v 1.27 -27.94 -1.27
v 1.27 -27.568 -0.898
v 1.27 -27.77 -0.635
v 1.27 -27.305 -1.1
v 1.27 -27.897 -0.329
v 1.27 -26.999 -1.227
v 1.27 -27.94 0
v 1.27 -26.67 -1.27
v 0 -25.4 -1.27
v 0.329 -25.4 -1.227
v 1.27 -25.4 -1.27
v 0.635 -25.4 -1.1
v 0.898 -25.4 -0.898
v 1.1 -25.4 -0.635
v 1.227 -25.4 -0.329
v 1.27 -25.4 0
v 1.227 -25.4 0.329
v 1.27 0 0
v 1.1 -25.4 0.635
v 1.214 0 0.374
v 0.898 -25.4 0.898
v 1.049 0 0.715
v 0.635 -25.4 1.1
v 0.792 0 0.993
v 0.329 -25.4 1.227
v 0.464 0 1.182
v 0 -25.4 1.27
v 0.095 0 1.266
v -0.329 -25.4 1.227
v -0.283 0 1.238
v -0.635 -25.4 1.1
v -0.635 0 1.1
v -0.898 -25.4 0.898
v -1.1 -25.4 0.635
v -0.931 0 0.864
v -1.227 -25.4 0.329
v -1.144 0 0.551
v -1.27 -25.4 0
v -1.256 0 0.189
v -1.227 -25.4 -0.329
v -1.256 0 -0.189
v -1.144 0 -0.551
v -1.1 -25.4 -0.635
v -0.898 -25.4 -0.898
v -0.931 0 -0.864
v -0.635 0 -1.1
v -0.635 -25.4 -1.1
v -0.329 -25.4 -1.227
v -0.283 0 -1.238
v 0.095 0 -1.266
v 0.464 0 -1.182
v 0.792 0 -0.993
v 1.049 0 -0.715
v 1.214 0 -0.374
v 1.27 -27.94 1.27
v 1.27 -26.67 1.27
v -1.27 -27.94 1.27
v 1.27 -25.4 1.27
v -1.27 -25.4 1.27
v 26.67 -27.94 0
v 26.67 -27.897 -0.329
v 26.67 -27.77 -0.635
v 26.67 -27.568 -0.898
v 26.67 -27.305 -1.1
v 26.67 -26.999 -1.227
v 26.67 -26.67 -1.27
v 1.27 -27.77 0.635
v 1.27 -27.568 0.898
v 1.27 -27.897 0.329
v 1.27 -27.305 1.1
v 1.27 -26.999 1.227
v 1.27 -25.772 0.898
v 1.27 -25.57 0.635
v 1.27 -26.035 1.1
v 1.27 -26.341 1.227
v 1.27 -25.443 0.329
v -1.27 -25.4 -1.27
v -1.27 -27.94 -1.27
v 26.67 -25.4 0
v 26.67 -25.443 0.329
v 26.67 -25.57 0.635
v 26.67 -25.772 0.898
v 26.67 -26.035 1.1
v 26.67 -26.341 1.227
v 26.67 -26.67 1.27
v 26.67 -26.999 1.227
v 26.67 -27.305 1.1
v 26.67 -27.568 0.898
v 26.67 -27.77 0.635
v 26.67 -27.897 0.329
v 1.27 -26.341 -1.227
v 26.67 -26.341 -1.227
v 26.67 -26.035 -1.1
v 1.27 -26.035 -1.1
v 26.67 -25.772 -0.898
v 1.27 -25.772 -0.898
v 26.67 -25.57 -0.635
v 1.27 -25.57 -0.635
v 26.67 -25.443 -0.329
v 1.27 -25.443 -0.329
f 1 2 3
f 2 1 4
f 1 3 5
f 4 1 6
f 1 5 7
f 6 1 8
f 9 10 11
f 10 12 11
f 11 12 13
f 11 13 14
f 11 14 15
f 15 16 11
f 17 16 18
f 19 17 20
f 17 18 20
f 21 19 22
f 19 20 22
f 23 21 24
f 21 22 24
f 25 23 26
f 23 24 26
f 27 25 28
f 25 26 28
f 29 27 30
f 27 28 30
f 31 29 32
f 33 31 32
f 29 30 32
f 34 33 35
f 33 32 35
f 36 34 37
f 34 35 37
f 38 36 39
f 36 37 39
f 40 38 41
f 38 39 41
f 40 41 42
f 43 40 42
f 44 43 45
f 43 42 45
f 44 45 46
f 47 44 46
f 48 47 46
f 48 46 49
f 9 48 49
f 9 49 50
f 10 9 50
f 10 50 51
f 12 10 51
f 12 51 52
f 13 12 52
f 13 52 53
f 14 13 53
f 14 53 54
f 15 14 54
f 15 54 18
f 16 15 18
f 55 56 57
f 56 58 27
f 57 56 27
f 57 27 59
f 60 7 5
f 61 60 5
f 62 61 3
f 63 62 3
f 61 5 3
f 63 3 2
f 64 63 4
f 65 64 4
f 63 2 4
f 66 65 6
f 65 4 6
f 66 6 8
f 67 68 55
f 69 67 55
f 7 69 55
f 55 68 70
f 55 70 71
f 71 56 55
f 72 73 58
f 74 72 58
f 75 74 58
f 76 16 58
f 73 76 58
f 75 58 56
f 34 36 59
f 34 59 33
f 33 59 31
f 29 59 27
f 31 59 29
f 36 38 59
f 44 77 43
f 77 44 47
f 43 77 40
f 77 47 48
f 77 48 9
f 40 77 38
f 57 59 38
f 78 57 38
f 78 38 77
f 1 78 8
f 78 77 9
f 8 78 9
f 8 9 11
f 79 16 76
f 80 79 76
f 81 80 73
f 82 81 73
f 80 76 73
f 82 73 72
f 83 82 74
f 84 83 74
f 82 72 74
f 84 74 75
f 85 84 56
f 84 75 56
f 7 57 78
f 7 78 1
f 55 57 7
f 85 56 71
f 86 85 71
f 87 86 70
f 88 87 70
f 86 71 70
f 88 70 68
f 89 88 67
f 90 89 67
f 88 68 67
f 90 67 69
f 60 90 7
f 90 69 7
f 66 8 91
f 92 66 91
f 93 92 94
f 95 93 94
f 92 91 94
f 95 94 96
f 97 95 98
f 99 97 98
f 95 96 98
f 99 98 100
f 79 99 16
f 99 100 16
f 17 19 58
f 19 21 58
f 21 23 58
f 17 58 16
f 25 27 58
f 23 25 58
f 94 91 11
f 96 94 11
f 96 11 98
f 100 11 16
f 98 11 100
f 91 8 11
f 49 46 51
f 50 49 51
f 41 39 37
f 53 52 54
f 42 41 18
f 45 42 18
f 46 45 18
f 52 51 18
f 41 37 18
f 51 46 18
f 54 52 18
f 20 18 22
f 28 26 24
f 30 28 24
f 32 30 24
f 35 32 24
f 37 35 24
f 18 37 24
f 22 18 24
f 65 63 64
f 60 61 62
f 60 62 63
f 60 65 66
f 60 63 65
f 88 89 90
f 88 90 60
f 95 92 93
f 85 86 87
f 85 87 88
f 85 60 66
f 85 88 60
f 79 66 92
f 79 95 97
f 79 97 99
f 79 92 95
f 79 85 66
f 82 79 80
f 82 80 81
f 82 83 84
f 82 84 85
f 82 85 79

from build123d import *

# Parameters (mm, degrees)
F0_R     = 1.27
F1_DEPTH = 25.4
F3_DEPTH = 2.54
F5_DEPTH = 25.4


with BuildPart() as f1:
    # F0 (on Front) → F1 (new body)
    with BuildSketch(Plane.XZ):
        Circle(F0_R)
    extrude(amount=F1_DEPTH)

    # F2 (on face) → F3 (join)
    with BuildSketch(Plane.XZ.offset(25.4)):
        with BuildLine():
            ThreePointArc((-1.27, 0), (-0.898026, -0.898026), (0, -1.27))
            ThreePointArc((0, -1.27), (0.898026, -0.898026), (1.27, 0))
            ThreePointArc((1.27, 0), (0.898026, 0.898026), (0, 1.27))
            ThreePointArc((0, 1.27), (-0.898026, 0.898026), (-1.27, 0))
        make_face()
        with BuildLine():
            ThreePointArc((0, 1.27), (0.898026, 0.898026), (1.27, 0))
            Line((1.27, 0), (1.27, 1.27))
            Line((1.27, 1.27), (0, 1.27))
        make_face()
        with BuildLine():
            Line((0, -1.27), (1.27, -1.27))
            Line((1.27, -1.27), (1.27, 0))
            ThreePointArc((1.27, 0), (0.898026, -0.898026), (0, -1.27))
        make_face()
        with BuildLine():
            Line((-1.27, -1.27), (0, -1.27))
            ThreePointArc((0, -1.27), (-0.898026, -0.898026), (-1.27, 0))
            Line((-1.27, 0), (-1.27, -1.27))
        make_face()
        with BuildLine():
            Line((-1.27, 1.27), (-1.27, 0))
            ThreePointArc((-1.27, 0), (-0.898026, 0.898026), (0, 1.27))
            Line((0, 1.27), (-1.27, 1.27))
        make_face()
    extrude(amount=F3_DEPTH)

    # F4 (on face) → F5 (join)
    with BuildSketch(Plane.YZ.offset(1.27)):
        with BuildLine():
            Line((-27.94, 0), (-25.4, 0))
            ThreePointArc((-25.4, 0), (-25.771974, 0.898026), (-26.67, 1.27))
            ThreePointArc((-26.67, 1.27), (-27.568026, 0.898026), (-27.94, 0))
        make_face()
        with BuildLine():
            ThreePointArc((-26.67, -1.27), (-25.771974, -0.898026), (-25.4, 0))
            Line((-25.4, 0), (-27.94, 0))
            ThreePointArc((-27.94, 0), (-27.568026, -0.898026), (-26.67, -1.27))
        make_face()
    extrude(amount=F5_DEPTH)


solid = f1.part
